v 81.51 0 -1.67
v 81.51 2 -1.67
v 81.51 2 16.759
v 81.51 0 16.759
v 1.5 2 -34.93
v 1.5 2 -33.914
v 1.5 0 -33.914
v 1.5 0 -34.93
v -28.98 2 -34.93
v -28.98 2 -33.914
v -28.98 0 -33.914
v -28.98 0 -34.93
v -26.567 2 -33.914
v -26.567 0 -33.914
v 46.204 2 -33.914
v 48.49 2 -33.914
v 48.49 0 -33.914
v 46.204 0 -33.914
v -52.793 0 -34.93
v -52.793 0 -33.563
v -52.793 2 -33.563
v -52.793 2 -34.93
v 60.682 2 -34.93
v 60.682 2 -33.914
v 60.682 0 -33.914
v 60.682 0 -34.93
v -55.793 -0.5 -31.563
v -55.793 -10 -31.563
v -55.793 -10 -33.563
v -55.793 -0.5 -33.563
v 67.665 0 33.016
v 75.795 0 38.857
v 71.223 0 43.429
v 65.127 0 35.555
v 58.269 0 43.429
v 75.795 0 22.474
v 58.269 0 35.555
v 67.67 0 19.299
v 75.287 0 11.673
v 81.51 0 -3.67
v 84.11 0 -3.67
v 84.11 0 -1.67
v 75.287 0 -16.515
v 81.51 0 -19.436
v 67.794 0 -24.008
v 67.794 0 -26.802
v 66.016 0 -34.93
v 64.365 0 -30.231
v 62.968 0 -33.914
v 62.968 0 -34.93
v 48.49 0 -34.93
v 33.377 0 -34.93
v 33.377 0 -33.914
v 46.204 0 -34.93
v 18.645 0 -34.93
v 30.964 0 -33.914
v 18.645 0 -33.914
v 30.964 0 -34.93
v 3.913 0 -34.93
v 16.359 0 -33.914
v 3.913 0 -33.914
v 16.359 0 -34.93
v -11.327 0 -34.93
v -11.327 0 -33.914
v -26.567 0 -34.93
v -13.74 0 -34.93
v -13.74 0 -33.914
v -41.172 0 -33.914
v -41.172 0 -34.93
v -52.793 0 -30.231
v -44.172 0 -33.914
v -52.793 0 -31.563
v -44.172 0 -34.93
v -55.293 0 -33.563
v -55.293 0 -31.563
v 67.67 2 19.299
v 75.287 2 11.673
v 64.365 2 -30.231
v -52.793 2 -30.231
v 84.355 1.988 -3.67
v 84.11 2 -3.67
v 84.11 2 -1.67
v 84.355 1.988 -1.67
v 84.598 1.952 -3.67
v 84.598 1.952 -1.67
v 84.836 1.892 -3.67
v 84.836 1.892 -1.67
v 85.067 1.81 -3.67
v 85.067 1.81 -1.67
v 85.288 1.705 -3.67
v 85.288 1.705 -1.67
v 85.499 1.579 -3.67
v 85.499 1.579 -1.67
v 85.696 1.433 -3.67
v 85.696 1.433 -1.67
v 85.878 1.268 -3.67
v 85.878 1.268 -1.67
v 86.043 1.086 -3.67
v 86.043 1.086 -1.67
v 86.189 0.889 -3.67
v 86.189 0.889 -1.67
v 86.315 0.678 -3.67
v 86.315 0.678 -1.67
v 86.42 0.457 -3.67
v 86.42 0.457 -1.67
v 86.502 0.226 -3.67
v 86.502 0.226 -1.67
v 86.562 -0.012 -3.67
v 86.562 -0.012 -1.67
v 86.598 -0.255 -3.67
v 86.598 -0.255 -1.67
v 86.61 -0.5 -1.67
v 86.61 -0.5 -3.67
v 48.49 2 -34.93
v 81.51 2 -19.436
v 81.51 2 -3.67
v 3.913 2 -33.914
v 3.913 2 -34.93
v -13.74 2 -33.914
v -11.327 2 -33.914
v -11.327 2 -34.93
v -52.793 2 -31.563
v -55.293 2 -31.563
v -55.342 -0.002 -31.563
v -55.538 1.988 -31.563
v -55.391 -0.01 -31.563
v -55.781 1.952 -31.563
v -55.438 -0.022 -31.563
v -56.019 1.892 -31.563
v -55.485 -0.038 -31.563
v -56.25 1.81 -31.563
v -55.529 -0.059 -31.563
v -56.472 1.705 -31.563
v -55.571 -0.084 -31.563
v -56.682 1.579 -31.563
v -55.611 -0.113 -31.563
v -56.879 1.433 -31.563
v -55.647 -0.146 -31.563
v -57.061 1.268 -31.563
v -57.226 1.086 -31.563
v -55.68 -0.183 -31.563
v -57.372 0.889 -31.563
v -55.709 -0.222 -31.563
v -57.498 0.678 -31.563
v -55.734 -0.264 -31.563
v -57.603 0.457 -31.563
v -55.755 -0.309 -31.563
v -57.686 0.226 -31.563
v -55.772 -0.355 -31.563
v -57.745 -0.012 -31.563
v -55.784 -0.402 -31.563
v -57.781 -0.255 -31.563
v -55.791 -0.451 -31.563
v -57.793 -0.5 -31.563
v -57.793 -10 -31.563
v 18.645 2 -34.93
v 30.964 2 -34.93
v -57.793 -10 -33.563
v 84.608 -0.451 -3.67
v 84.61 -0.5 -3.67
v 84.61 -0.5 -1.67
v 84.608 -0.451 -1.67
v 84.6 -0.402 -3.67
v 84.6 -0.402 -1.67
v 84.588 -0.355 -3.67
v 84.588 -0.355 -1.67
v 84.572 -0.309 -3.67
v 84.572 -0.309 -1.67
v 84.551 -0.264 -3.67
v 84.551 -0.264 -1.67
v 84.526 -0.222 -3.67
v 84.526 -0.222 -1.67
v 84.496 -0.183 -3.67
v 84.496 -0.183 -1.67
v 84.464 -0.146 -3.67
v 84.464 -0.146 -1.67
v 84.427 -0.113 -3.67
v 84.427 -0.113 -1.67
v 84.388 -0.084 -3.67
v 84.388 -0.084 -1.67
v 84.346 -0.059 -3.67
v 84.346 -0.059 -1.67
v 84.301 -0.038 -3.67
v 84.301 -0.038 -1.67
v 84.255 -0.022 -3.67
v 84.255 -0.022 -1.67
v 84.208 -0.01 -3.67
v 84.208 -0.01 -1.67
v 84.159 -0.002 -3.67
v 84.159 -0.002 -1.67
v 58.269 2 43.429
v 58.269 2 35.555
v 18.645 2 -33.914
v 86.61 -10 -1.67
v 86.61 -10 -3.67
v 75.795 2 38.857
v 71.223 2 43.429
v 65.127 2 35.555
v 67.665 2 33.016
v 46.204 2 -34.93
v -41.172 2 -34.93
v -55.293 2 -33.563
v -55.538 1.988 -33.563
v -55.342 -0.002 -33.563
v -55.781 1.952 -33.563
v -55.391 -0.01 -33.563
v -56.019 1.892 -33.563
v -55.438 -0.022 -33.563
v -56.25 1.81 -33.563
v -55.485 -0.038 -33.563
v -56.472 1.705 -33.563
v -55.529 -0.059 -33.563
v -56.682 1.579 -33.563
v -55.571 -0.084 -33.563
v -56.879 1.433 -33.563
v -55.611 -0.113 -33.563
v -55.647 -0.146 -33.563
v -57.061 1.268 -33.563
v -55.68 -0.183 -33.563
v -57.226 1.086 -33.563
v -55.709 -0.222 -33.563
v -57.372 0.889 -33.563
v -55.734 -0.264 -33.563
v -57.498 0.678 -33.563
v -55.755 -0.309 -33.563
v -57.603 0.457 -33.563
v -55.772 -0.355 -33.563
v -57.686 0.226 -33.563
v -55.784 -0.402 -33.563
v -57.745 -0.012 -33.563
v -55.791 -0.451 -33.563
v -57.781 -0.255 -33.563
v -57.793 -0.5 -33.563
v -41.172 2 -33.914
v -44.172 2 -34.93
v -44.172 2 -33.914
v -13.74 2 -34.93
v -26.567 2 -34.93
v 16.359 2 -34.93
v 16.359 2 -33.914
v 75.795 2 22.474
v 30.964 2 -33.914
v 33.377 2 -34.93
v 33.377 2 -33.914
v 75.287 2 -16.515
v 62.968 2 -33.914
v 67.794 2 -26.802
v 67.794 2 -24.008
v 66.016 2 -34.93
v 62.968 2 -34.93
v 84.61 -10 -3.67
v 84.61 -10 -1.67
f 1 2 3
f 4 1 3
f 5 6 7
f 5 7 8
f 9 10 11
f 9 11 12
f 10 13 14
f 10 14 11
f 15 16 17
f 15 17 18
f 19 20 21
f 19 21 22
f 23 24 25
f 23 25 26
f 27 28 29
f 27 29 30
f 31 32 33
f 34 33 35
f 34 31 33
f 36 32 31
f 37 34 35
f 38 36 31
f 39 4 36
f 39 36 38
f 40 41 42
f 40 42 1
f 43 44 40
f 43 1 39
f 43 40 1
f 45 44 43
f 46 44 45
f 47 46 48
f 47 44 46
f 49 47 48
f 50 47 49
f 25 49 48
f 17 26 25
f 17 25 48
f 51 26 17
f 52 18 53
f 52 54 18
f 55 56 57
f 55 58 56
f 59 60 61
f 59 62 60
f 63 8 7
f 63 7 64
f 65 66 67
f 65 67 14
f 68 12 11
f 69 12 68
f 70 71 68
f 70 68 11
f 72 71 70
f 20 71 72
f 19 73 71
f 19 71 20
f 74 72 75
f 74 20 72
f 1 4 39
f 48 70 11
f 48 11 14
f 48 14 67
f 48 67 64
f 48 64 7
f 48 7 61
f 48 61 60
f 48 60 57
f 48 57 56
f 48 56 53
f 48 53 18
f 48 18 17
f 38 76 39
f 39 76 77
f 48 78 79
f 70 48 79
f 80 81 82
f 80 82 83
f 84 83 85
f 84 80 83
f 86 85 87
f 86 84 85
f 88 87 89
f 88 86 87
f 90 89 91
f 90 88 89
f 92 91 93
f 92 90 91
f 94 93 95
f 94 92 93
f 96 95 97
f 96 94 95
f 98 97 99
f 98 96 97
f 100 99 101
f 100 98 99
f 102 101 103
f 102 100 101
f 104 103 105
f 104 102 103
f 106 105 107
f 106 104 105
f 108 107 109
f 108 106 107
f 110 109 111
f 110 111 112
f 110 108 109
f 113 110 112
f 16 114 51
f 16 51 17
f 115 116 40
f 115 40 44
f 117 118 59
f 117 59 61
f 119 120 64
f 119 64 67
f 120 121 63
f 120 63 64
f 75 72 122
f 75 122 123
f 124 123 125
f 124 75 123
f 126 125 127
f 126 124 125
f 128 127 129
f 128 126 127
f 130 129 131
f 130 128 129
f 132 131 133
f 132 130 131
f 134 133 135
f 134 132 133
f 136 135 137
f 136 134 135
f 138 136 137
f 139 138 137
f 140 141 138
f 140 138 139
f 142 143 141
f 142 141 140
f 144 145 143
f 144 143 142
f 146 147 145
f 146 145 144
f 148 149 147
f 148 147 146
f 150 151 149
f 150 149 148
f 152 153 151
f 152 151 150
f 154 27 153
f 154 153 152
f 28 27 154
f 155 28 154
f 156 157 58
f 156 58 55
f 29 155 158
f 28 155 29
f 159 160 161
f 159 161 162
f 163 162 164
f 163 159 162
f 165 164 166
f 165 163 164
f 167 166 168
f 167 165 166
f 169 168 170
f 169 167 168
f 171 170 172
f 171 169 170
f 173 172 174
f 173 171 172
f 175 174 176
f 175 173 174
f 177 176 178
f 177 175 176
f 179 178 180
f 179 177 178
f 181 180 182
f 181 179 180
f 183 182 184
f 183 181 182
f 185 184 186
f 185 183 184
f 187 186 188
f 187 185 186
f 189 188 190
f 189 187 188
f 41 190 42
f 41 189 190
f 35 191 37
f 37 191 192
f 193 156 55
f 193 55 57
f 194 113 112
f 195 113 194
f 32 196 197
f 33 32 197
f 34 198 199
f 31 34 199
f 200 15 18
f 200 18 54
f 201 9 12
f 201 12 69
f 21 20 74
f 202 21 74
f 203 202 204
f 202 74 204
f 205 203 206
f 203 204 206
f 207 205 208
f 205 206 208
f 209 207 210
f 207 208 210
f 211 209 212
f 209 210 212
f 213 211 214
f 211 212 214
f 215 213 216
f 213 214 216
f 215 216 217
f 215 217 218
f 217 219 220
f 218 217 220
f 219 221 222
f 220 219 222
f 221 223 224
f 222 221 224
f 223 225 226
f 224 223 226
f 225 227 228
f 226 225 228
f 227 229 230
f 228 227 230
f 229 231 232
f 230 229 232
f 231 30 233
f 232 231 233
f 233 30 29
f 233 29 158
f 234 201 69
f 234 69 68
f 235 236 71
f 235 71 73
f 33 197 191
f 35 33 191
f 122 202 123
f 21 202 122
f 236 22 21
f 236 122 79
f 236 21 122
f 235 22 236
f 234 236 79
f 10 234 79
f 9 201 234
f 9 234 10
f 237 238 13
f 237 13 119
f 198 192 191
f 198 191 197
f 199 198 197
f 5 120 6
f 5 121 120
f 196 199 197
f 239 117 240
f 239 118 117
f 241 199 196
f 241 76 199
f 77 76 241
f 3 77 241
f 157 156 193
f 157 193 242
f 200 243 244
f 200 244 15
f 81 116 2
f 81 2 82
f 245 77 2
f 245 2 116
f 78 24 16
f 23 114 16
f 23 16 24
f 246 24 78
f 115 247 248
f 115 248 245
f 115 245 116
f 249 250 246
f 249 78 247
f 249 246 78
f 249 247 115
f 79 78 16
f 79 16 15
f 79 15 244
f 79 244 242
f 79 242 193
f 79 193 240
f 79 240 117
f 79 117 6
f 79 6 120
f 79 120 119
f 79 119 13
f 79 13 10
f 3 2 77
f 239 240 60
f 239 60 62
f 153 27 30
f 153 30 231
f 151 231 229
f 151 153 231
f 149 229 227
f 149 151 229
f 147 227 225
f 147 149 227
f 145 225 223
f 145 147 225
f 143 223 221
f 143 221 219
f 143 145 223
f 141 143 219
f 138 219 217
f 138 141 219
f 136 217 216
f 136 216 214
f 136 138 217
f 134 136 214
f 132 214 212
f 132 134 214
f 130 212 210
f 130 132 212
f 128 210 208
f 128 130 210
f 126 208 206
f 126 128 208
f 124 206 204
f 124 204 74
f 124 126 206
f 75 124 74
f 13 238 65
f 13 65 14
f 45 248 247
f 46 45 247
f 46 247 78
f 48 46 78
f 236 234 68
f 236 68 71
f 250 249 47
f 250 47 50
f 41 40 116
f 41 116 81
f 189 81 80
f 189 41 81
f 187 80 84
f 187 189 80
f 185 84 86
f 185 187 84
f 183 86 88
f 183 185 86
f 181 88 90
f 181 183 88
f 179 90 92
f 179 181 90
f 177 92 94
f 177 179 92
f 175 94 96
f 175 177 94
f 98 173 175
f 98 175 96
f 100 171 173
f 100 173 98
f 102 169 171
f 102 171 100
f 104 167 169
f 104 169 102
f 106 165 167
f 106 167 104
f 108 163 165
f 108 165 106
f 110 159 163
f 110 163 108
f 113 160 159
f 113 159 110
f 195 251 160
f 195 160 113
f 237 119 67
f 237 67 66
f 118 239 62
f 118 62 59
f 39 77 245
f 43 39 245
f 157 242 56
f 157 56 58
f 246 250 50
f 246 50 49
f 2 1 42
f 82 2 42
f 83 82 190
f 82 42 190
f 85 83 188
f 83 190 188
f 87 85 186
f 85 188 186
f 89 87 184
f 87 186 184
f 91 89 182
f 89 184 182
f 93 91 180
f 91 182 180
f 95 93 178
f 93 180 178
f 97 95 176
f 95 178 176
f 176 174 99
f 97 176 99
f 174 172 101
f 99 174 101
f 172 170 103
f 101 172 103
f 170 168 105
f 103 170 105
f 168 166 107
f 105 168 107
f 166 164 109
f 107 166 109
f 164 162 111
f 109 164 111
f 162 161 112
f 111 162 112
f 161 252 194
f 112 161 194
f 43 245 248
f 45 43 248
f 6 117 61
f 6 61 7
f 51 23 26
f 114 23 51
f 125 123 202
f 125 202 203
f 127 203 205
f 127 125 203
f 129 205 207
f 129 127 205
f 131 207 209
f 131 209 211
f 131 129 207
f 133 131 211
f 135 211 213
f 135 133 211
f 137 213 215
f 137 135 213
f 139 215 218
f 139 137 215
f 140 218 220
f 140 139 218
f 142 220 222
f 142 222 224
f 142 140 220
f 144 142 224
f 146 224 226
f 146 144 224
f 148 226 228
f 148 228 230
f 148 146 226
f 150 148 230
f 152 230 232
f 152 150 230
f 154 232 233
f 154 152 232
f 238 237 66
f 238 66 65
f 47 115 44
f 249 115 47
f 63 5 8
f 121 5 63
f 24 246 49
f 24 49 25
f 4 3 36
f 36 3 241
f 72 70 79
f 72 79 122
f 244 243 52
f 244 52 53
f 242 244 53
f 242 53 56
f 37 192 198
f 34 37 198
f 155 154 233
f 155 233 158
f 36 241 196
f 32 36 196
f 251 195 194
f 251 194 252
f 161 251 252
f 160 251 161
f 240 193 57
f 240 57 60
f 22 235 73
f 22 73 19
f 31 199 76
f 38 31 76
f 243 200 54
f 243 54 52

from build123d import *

# Parameters (mm, degrees)
BOSS_EXTRUDE1_DEPTH = 2
EDGE_FLANGE1_DEPTH  = 2
EDGE_FLANGE2_DEPTH  = 2
CUT_EXTRUDE3_DEPTH  = 10


# Sheet-metal steps are written as plain solids
with BuildPart() as part:
    # Sketch2 → Boss-Extrude1 (new body)
    with BuildSketch(Plane(origin=(0, 0, 0), x_dir=(1, 0, 0), z_dir=(0, 1, 0))):
        Polygon((81.609993248, 1.669814581), (81.609993248, -16.836643227), (75.909994488, -22.536641987), (75.909994488, -38.936642207), (70.009993588, -44.836643107), (58.109994528, -44.836643107), (58.109994528, -34.336641247), (63.809993288, -34.336641247), (67.509993508, -30.636641027), (67.509993508, -19.345596807), (75.109993548, -11.745596767), (75.109993548, 16.463358753), (67.709993108, 23.863356653), (67.709993108, 26.763358473), (64.309994828, 30.163356753), (-43.190006072, 30.163356753), (-52.793309772, 30.163356753), (-52.793309772, 31.563357033), (-54.793309772, 31.563357033), (-54.793309772, 33.563357033), (-52.793309772, 33.563357033), (-52.793309772, 34.963357313), (-43.190006072, 34.963357313), (66.209993568, 34.963357313), (81.609993248, 19.563357633), (81.609993248, 3.669814581), (83.609993248, 3.669814581), (83.609993248, 1.669814581), align=None)
    extrude(amount=BOSS_EXTRUDE1_DEPTH)

    # Edge-Flange1 section (across the edge) → Edge-Flange1 (add)
    with BuildSketch(Plane(origin=(-55.793309772, 0, -31.563357033), x_dir=(1, 0, 0), z_dir=(0, 0, -1))):
        with BuildLine():
            Line((-2, 0.5), (-2, 10))
            Line((-2, 10), (0, 10))
            Line((0, 10), (0, 0.5))
            ThreePointArc((0, 0.5), (0.146446609, 0.146446609), (0.5, 0))
            Line((0.5, 0), (1, 0))
            Line((1, 0), (1, -2))
            Line((1, -2), (0.5, -2))
            ThreePointArc((0.5, -2), (-1.267766953, -1.267766953), (-2, 0.5))
        make_face()
    extrude(amount=EDGE_FLANGE1_DEPTH)

    # Edge-Flange2 section (across the edge) → Edge-Flange2 (add)
    with BuildSketch(Plane(origin=(84.609993248, 0, -3.669814581), x_dir=(-1, 0, 0), z_dir=(0, 0, 1))):
        with BuildLine():
            Line((-2, 0.5), (-2, 10))
            Line((-2, 10), (0, 10))
            Line((0, 10), (0, 0.5))
            ThreePointArc((0, 0.5), (0.146446609, 0.146446609), (0.5, 0))
            Line((0.5, 0), (1, 0))
            Line((1, 0), (1, -2))
            Line((1, -2), (0.5, -2))
            ThreePointArc((0.5, -2), (-1.267766953, -1.267766953), (-2, 0.5))
        make_face()
    extrude(amount=EDGE_FLANGE2_DEPTH)

    # Sketch13 → Cut-Extrude3 (cut)
    with BuildSketch(Plane(origin=(0, 2, 0), x_dir=(1, 0, 0), z_dir=(0, 1, 0))):
        Polygon((64.364993832, 30.231358373), (-43.077006168, 30.231358373), (-52.793309772, 30.231358373), (-52.793309772, 30.163356753), (64.309994828, 30.163356753), (67.709993108, 26.763358473), (67.709993108, 23.863356653), (75.109993548, 16.463358753), (75.109993548, -11.745596767), (67.509993508, -19.345596807), (67.509993508, -30.636641027), (63.809993288, -34.336641247), (58.109994528, -34.336641247), (58.109994528, -44.836643107), (70.009993588, -44.836643107), (75.909994488, -38.936642207), (75.909994488, -22.536641987), (81.609993248, -16.836643227), (81.609993248, 1.669814581), (81.509993832, 1.669814581), (81.509993832, -16.758641627), (75.794993832, -22.473641627), (75.794993832, -38.856641627), (71.222993832, -43.428641627), (58.268993832, -43.428641627), (58.268993832, -35.554641627), (65.126993832, -35.554641627), (67.665284412, -33.016351047), (67.669899592, -19.298575587), (75.286993832, -11.672504987), (75.286993832, 16.515358373), (67.793993832, 24.008355833), (67.793993832, 26.802358373), align=None)
        Polygon((-52.793309772, 30.163356753), (-52.793309772, 30.231358373), (-53.09278865, 30.231358373), (-53.09278865, 29.122247983), (64.073173088, 29.122247983), (66.904295046, 26.802358373), (66.904295046, 23.685270997), (74.890508664, 15.670381273), (73.855495628, -9.951608799), (66.571415804, -17.811521066), (66.392045366, -24.291741654), (65.126993832, -32.125935595), (57.650093481, -33.249786732), (57.276841603, -46.73447534), (58.268993832, -46.73447534), (69.513593476, -46.73447534), (76.944541222, -41.148796497), (77.641700893, -23.890445583), (84.109993248, -17.212504202), (84.109993248, 1.669814581), (81.609993248, 1.669814581), (81.609993248, -16.836643227), (75.909994488, -22.536641987), (75.909994488, -38.936642207), (70.009993588, -44.836643107), (58.109994528, -44.836643107), (58.109994528, -34.336641247), (63.809993288, -34.336641247), (67.509993508, -30.636641027), (67.509993508, -19.345596807), (75.109993548, -11.745596767), (75.109993548, 16.463358753), (67.709993108, 23.863356653), (67.709993108, 26.763358473), (64.309994828, 30.163356753), align=None)
        Polygon((84.109993248, 19.032357692), (84.109993248, 3.669814581), (81.509993832, 3.669814581), (81.509993832, 19.436358373), (66.015993832, 34.930358373), (62.967993832, 34.930358373), (62.967993832, 33.914358373), (60.681993832, 33.914358373), (60.681993832, 34.930358373), (48.489993832, 34.930358373), (48.489993832, 33.914358373), (46.203993832, 33.914358373), (46.203993832, 34.930358373), (33.376993832, 34.930358373), (33.376993832, 33.914358373), (30.963993832, 33.914358373), (30.963993832, 34.930358373), (18.644993832, 34.930358373), (18.644993832, 33.914358373), (16.358993832, 33.914358373), (16.358993832, 34.930358373), (3.912993832, 34.930358373), (3.912993832, 33.914358373), (1.499993832, 33.914358373), (1.499993832, 34.930358373), (-11.327006168, 34.930358373), (-11.327006168, 33.914358373), (-13.740006168, 33.914358373), (-13.740006168, 34.930358373), (-26.567006168, 34.930358373), (-26.567006168, 33.914358373), (-28.980006168, 33.914358373), (-28.980006168, 34.930358373), (-41.172006168, 34.930358373), (-41.172006168, 33.914358373), (-44.172006168, 33.914358373), (-44.172006168, 34.930358373), (-54.307784522, 34.930358373), (-54.307784522, 35.697895733), (66.904295046, 35.697895733), align=None)
    extrude(amount=-CUT_EXTRUDE3_DEPTH, mode=Mode.SUBTRACT)


solid = part.part
